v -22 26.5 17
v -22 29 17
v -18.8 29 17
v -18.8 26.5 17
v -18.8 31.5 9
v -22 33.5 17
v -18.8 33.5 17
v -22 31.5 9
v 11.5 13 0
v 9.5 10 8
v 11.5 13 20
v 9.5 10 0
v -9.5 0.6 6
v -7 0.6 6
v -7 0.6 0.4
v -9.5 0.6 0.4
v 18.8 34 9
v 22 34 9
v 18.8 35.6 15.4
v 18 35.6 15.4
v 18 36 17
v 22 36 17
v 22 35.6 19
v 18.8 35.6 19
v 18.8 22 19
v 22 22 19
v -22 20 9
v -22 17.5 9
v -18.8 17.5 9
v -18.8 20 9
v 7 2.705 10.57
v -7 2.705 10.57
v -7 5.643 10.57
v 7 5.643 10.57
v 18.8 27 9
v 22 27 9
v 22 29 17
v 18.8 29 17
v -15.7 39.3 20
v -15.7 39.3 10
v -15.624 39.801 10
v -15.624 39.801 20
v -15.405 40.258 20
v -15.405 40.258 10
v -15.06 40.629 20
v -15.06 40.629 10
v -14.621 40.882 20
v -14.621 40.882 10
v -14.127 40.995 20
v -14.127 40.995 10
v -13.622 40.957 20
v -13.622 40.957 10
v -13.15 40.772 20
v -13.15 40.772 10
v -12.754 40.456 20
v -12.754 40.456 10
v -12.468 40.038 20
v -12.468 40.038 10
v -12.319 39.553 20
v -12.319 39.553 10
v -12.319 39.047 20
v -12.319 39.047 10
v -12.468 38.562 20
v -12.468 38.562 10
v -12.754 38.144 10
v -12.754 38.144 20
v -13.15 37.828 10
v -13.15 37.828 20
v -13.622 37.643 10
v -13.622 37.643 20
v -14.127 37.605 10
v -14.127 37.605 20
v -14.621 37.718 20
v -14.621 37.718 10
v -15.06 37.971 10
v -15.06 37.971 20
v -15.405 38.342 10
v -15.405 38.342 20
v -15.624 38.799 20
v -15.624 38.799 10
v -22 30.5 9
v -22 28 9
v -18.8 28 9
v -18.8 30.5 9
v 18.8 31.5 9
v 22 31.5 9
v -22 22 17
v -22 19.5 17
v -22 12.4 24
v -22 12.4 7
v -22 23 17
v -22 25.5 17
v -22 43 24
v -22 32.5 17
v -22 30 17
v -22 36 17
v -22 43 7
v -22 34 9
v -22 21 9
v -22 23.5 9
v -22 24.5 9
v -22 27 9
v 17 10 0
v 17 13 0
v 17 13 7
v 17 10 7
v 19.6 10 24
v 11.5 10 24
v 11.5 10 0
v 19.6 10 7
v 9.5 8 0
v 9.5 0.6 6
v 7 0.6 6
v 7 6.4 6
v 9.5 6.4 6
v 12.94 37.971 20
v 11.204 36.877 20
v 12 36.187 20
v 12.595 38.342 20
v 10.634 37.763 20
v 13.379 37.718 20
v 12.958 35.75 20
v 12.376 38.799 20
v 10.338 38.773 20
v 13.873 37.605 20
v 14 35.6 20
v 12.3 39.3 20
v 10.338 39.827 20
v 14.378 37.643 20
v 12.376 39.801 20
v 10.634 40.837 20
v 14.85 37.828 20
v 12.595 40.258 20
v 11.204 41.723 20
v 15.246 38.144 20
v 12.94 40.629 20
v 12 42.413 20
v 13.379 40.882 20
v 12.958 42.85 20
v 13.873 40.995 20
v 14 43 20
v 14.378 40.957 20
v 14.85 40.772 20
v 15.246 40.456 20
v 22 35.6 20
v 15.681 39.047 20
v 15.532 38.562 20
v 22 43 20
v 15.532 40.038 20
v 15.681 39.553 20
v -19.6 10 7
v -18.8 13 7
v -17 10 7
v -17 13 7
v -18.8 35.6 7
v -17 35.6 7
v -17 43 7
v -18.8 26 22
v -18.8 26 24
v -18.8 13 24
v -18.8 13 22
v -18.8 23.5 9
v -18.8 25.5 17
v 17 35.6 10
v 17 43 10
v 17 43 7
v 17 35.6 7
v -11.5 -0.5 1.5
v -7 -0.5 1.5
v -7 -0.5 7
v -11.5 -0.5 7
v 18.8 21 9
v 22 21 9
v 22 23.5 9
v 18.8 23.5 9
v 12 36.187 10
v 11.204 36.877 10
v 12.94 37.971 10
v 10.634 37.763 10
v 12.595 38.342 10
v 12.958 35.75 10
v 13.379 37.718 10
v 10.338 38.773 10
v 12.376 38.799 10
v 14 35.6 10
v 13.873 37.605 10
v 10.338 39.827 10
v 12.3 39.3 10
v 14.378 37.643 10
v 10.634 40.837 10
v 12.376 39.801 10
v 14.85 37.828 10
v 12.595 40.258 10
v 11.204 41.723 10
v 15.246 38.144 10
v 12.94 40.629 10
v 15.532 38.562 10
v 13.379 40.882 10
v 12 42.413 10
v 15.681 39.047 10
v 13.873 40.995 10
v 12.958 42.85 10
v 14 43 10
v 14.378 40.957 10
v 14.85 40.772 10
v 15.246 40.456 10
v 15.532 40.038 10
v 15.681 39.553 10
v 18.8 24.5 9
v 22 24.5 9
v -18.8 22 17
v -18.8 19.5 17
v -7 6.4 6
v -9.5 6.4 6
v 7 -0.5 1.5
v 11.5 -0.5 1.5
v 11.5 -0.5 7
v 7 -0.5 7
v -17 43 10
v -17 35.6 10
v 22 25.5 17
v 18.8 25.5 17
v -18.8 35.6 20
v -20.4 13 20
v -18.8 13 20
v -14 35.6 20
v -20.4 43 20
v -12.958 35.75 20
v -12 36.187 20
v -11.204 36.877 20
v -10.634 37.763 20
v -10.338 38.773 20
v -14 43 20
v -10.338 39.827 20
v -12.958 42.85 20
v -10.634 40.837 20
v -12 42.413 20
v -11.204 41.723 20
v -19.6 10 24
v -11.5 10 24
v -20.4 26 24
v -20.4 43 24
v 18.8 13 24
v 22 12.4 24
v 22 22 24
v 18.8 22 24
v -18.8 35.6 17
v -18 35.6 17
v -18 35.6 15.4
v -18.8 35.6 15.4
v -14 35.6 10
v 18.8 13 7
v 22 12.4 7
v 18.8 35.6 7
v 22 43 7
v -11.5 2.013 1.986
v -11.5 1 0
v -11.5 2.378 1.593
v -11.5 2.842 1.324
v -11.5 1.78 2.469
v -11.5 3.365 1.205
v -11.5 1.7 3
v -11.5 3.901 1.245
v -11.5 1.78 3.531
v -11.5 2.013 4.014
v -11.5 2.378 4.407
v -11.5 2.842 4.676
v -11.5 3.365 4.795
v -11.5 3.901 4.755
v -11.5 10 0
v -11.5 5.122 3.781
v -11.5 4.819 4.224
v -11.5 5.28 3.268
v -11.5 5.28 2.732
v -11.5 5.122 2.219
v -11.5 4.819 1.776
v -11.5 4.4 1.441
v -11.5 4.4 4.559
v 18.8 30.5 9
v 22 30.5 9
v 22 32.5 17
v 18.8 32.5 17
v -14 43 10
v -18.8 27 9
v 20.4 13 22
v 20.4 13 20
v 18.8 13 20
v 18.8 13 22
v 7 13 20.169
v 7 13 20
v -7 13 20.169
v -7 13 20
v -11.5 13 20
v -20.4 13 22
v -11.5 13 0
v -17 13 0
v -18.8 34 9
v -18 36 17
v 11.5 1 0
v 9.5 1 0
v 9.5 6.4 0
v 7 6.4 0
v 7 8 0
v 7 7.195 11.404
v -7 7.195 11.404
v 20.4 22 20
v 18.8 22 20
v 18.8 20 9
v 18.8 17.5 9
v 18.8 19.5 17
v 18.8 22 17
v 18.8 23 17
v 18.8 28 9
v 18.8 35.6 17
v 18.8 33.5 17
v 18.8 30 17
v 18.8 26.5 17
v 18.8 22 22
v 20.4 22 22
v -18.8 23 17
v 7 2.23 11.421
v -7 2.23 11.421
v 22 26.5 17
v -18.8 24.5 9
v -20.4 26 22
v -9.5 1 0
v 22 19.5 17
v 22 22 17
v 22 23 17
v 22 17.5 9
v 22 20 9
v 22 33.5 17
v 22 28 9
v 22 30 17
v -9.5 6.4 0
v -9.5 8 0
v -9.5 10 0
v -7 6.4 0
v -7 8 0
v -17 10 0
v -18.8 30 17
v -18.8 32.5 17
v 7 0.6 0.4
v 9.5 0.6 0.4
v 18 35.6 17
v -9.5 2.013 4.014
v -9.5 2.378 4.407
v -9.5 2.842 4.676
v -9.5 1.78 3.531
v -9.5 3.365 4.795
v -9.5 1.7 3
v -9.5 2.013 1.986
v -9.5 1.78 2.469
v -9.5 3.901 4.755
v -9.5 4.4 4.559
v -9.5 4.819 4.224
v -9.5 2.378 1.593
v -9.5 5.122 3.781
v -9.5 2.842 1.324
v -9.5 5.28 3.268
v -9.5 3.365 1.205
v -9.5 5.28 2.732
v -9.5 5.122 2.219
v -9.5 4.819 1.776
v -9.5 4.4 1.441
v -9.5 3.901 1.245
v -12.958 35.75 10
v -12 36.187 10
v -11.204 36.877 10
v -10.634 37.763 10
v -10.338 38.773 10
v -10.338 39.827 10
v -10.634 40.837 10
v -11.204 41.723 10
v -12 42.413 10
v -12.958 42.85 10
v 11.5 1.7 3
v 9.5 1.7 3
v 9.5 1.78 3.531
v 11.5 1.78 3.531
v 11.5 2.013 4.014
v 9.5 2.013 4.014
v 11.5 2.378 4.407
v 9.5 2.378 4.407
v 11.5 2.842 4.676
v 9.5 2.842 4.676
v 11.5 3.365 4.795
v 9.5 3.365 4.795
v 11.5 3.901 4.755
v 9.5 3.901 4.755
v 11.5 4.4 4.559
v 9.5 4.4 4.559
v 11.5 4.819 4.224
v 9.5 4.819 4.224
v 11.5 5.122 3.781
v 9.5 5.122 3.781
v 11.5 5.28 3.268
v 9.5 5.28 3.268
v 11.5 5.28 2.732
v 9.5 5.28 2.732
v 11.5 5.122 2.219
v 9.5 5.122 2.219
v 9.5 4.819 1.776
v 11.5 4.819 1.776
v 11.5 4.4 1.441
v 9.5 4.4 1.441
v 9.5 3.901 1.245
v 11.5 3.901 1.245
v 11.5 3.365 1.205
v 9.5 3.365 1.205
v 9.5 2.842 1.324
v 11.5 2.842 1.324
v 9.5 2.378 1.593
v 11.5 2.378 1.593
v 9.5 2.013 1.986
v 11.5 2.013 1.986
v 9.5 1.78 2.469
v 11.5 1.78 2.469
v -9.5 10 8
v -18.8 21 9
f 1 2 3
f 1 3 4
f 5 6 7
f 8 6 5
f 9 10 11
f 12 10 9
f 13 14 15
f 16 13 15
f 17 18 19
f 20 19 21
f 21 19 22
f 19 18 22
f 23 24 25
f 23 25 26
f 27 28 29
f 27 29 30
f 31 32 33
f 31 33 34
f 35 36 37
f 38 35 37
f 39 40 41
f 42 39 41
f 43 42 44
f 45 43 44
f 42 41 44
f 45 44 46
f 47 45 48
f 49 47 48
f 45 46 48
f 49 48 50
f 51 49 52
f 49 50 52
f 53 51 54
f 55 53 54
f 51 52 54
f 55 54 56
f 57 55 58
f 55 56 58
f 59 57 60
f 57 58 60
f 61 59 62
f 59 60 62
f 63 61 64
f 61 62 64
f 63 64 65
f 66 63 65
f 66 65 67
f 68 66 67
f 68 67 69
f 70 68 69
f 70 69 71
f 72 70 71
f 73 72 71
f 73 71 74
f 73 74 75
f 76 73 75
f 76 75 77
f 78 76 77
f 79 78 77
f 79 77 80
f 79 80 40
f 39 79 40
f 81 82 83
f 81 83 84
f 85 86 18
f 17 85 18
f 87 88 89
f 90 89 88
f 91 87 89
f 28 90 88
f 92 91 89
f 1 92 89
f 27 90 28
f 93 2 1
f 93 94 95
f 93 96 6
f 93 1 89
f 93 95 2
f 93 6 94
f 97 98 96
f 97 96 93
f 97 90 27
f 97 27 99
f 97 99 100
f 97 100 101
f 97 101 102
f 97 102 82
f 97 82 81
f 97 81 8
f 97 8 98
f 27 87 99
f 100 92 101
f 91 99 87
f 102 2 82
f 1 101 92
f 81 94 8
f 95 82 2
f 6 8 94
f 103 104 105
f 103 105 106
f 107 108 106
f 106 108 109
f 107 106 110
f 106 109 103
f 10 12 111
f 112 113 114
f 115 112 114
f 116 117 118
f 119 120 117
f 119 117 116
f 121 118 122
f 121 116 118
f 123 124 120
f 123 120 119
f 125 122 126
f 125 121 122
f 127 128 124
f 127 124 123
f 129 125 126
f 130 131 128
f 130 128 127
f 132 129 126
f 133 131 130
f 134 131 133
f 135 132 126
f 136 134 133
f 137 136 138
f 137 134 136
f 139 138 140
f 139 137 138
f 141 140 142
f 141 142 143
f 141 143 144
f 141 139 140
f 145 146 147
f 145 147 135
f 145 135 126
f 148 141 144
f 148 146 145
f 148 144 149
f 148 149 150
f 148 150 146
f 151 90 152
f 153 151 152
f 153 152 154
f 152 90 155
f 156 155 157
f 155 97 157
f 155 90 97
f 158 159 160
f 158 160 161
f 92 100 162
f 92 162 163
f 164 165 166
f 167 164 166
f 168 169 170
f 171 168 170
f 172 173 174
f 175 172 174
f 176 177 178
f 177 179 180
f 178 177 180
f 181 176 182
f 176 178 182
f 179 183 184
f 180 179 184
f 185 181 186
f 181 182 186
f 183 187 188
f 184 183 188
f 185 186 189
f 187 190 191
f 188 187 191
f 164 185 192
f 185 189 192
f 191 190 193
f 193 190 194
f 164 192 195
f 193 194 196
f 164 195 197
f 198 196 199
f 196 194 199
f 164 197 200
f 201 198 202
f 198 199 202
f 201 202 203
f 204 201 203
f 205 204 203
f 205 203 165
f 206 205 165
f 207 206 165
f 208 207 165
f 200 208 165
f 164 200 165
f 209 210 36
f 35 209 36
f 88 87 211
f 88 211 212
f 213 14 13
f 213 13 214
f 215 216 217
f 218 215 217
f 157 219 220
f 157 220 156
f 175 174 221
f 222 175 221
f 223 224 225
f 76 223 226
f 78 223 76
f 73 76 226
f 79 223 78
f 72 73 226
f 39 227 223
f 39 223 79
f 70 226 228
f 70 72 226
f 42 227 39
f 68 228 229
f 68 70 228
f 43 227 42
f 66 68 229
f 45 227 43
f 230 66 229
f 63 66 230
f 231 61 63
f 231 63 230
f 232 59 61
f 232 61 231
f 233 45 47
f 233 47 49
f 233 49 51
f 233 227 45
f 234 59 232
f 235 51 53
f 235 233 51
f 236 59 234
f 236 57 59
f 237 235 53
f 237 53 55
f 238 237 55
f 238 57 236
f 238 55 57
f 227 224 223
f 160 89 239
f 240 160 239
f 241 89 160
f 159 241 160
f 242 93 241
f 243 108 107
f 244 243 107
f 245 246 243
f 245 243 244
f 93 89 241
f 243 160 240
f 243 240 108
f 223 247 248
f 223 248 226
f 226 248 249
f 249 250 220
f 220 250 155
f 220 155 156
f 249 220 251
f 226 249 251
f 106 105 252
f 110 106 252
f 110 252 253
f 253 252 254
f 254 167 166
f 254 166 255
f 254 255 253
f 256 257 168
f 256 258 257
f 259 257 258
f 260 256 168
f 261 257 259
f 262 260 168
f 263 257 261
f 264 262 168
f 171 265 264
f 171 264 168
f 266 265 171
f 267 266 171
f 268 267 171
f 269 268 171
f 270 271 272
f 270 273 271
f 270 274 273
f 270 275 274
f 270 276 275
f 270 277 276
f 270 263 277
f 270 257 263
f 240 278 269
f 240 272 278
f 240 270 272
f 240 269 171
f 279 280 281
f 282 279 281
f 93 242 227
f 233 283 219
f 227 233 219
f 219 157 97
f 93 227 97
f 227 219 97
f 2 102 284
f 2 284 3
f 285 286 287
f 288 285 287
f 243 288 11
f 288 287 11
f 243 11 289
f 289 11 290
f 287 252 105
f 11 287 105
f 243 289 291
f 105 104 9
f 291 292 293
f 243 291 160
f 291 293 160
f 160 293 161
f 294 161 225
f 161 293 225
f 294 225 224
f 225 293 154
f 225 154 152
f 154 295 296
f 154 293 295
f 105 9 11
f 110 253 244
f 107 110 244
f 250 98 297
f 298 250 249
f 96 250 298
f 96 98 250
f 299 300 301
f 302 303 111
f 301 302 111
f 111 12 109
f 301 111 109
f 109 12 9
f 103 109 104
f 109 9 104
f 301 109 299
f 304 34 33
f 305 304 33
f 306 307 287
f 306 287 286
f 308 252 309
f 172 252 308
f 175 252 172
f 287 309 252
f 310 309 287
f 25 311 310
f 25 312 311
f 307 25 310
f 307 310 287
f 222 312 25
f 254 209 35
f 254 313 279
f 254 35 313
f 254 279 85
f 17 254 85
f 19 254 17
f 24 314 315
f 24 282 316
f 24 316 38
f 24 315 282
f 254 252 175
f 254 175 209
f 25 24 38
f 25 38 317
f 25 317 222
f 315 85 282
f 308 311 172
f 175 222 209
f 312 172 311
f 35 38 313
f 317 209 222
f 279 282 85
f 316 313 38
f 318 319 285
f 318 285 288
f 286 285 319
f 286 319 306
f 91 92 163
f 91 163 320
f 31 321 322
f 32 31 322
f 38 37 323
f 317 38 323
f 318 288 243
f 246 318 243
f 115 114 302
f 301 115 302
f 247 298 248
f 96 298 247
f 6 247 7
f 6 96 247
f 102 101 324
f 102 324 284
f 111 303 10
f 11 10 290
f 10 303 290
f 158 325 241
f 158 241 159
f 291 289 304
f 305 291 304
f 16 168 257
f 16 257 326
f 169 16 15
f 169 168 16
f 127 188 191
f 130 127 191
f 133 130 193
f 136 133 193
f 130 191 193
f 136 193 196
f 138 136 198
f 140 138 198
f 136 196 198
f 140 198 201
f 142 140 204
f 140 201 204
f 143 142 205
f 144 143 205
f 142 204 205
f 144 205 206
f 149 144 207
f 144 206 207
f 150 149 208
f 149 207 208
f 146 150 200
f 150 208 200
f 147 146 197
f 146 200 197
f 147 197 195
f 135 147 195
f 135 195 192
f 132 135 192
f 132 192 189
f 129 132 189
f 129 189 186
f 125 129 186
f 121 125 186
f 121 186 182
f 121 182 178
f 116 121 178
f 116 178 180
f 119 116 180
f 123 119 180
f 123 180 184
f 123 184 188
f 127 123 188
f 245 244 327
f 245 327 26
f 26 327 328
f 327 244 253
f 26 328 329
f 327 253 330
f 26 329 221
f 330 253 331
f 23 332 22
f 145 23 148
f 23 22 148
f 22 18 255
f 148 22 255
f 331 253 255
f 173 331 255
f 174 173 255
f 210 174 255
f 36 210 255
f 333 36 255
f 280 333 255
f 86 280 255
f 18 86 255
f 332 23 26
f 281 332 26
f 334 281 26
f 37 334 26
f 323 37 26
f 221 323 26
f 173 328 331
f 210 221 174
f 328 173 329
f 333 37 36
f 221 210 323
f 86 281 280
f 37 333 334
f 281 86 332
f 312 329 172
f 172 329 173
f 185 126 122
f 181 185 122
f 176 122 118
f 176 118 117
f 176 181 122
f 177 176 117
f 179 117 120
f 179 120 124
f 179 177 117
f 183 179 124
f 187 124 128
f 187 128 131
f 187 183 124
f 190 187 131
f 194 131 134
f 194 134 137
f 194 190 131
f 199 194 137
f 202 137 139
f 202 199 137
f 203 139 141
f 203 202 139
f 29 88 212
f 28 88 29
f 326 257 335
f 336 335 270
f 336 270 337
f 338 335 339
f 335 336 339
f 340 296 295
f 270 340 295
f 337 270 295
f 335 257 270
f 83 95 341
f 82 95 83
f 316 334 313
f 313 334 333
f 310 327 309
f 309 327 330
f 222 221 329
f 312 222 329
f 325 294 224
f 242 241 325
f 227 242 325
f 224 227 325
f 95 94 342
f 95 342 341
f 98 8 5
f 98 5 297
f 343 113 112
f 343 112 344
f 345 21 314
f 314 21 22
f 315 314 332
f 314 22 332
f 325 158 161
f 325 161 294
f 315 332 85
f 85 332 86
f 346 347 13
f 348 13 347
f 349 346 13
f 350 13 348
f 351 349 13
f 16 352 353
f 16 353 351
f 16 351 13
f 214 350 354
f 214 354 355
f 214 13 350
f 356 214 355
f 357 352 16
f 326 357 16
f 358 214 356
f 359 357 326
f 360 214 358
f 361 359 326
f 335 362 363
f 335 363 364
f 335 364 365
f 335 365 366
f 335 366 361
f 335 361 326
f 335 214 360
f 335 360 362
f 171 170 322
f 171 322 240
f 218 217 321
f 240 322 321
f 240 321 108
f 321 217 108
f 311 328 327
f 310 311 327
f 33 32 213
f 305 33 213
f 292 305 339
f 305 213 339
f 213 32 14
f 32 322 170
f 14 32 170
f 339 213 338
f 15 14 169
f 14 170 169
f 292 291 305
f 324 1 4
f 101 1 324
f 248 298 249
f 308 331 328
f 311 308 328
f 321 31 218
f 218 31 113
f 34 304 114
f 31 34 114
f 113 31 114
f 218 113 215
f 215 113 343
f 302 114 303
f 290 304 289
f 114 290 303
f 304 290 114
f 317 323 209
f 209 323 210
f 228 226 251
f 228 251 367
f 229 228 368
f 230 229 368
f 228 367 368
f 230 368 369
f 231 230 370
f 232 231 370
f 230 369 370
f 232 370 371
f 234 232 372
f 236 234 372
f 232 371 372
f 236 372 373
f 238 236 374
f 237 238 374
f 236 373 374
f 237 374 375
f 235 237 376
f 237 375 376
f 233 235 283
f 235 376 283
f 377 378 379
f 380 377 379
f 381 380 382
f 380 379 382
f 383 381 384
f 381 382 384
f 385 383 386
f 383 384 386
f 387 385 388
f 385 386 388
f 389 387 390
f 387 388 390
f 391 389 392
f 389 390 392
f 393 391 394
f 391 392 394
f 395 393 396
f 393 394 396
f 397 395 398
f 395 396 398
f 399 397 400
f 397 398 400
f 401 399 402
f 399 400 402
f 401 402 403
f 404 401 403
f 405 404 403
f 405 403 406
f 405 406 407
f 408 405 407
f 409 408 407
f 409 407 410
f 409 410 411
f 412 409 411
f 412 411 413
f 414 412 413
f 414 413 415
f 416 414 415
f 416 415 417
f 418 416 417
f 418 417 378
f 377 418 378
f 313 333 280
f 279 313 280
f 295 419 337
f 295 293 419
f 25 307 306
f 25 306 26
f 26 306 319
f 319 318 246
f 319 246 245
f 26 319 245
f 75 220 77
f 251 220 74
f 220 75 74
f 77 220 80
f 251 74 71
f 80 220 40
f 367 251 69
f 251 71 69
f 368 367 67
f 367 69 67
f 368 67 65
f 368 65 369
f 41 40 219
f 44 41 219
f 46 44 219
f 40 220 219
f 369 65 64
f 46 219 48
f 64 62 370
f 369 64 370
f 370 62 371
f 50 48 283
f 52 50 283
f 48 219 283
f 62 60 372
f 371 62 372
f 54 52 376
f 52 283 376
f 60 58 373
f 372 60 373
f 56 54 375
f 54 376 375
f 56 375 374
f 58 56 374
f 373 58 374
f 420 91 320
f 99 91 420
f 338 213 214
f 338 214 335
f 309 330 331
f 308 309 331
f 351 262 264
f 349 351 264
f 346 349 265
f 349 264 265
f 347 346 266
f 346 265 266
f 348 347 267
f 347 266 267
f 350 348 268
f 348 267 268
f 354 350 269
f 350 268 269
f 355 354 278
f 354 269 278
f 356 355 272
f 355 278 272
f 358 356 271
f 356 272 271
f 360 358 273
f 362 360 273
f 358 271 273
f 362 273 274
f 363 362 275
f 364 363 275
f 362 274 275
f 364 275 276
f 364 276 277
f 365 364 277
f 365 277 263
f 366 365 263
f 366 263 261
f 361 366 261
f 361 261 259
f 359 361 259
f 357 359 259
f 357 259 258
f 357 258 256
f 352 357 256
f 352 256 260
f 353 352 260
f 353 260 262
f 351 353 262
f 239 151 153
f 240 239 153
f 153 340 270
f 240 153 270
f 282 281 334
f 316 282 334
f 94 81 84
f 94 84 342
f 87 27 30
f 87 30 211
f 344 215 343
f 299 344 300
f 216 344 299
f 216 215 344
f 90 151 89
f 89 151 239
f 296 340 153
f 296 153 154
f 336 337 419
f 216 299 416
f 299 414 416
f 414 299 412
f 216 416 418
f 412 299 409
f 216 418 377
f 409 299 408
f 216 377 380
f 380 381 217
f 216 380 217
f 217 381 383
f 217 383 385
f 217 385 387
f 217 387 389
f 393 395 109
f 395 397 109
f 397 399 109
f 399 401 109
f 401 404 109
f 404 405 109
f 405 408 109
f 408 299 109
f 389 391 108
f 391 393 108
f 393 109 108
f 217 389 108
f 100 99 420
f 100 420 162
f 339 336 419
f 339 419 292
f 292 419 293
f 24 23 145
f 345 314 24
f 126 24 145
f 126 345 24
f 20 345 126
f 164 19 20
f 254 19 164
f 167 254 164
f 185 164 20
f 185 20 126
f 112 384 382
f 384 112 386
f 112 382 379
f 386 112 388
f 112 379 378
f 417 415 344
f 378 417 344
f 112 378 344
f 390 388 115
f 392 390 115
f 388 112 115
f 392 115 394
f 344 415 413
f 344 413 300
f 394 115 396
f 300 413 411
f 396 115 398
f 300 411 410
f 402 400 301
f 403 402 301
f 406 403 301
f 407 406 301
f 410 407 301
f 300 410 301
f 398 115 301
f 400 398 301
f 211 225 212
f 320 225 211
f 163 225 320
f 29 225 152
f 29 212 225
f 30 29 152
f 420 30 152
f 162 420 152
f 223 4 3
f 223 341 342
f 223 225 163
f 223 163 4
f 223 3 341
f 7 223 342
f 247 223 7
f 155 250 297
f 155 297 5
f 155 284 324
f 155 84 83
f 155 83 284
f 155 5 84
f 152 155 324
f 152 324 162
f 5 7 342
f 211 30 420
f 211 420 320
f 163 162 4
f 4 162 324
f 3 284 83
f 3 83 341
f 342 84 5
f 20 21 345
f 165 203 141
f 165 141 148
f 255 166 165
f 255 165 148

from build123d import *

# Parameters (mm, degrees)
SKETCH_1_W           = 44
SKETCH_1_H           = 34
EXTRUDE_1_DEPTH      = 24
CUT_EXTRUDE_1_DEPTH  = 31
SKETCH_5_W           = 23
SKETCH_5_H           = 10.5
EXTRUDE_4_DEPTH      = 1
EXTRUDE_5_DEPTH      = 23
SKETCH_7_R           = 1.8
CUT_EXTRUDE_2_DEPTH  = 23
CUT_EXTRUDE_4_DEPTH  = 19
CHAMFER_2_SIZE       = 2
CHAMFER_2_SIZE2      = 3
SKETCH_11_R          = 1.7
EXTRUDE_6_DEPTH      = 20
CUT_EXTRUDE_7_DEPTH  = 4
CHAMFER_3_SIZE       = 2.4
SKETCH_14_W          = 40.8
SKETCH_14_H          = 4
CUT_EXTRUDE_8_DEPTH  = 18
SKETCH_15_W          = 44
SKETCH_15_H          = 1
CUT_EXTRUDE_9_DEPTH  = 24
SKETCH_16_W          = 3.2
SKETCH_16_H          = 13.6
CUT_EXTRUDE_10_DEPTH = 5
SKETCH_17_W          = 1.6
SKETCH_17_H          = 4
CUT_EXTRUDE_11_DEPTH = 7.4
CUT_EXTRUDE_12_DEPTH = 7
SKETCH_19_W          = 1
SKETCH_19_H          = 10.5
CUT_EXTRUDE_13_DEPTH = 23
CHAMFER_4_SIZE       = 1.5
CHAMFER_5_SIZE       = 3
CHAMFER_5_SIZE2      = 2
CUT_EXTRUDE_START    = -3
SKETCH_20_W          = 14
SKETCH_20_H          = 11.956557484
CUT_EXTRUDE_14_DEPTH = 17
CHAMFER_6_SIZE       = 10
CHAMFER_6_SIZE_2     = 4
CHAMFER_7_SIZE       = 1
SKETCH_22_W          = 6.7
SKETCH_22_H          = 10
CUT_EXTRUDE_15_DEPTH = 10
SKETCH_24_W          = 6
SKETCH_24_H          = 5.8
CUT_EXTRUDE_16_DEPTH = 2.5


with BuildPart() as part:
    # Эскиз1 → Бобышка-Вытянуть1 (new body)
    with BuildSketch(Plane.XY):
        with Locations((0, 27)):
            Rectangle(SKETCH_1_W, SKETCH_1_H)
    extrude(amount=EXTRUDE_1_DEPTH)

    # Эскиз2 → Вырез-Вытянуть1 (cut)
    with BuildSketch(Plane(origin=(0, 44, 0), x_dir=(1, 0, 0), z_dir=(0, 1, 0))):
        Polygon((-18.8, 0), (18.8, 0), (18.8, -20), (20.4, -20), (20.4, -22), (18.8, -22), (18.8, -24), (-18.8, -24), (-18.8, -22), (-20.4, -22), (-20.4, -20), (-18.8, -20), align=None)
    extrude(amount=-CUT_EXTRUDE_1_DEPTH, mode=Mode.SUBTRACT)



with BuildPart() as body_2:
    # Эскиз5 → Бобышка-Вытянуть4 (new body)
    with BuildSketch(Plane(origin=(0, 0, 0), x_dir=(-1, 0, 0), z_dir=(0, 0, -1))):
        with Locations((0, 4.75)):
            Rectangle(SKETCH_5_W, SKETCH_5_H)
    extrude(amount=EXTRUDE_4_DEPTH)


with BuildPart() as part_1:
    add(part.part)

    add(body_2.part)  # Бобышка-Вытянуть5 merges body 2
    # Эскиз6 → Бобышка-Вытянуть5 (add)
    with BuildSketch(Plane(origin=(11.5, 0, 0), x_dir=(0, 0, -1), z_dir=(1, 0, 0))):
        Polygon((0, -0.5), (-7, -0.5), (-24, 10), (0, 10), align=None)
    extrude(amount=-EXTRUDE_5_DEPTH)

    # Эскиз7 → Вырез-Вытянуть2 (cut)
    with BuildSketch(Plane.ZY.offset(11.5)):
        with Locations(Location((3, 3.5, 0), (0, 0, 270))):
            Circle(SKETCH_7_R)
    extrude(amount=-CUT_EXTRUDE_2_DEPTH, mode=Mode.SUBTRACT)

    # Эскиз8 → Вырез-Вытянуть4 (cut)
    with BuildSketch(Plane.ZY.offset(9.5)):
        Polygon((0, 8), (20, 13), (0, 13), align=None)
    extrude(amount=-CUT_EXTRUDE_4_DEPTH, mode=Mode.SUBTRACT)

    # Фаска2
    chamfer_2_edges = [part_1.edges().sort_by_distance(p)[0] for p in [
        (9.5, 13, 10),
    ]]
    chamfer_2_side = [part_1.faces().sort_by_distance(p)[0] for p in [
        (-18.32664601, 13, 10),
    ]]
    chamfer(chamfer_2_edges, length=CHAMFER_2_SIZE, length2=CHAMFER_2_SIZE2, reference=chamfer_2_side[0])

    # Эскиз11 → Бобышка-Вытянуть6 (add)
    # profile 1 of 2: a face of its own
    with BuildSketch(Plane(origin=(0, 0, 0), x_dir=(-1, 0, 0), z_dir=(0, 0, -1))):
        with BuildLine():
            Line((-14, 43), (-18.8, 43))
            Line((-18.8, 43), (-18.8, 35.6))
            Line((-18.8, 35.6), (-14, 35.6))
            ThreePointArc((-14, 35.6), (-10.3, 39.3), (-14, 43))
        make_face()
        with Locations((-14, 39.3)):
            Circle(SKETCH_11_R, mode=Mode.SUBTRACT)
    # profile 2 of 2: a face of its own
    with BuildSketch(Plane(origin=(0, 0, 0), x_dir=(-1, 0, 0), z_dir=(0, 0, -1))):
        with BuildLine():
            Line((18.8, 35.6), (14, 35.6))
            ThreePointArc((14, 35.6), (10.3, 39.3), (14, 43))
            Line((14, 43), (18.8, 43))
            Line((18.8, 43), (18.8, 35.6))
        make_face()
        with Locations((14, 39.3)):
            Circle(SKETCH_11_R, mode=Mode.SUBTRACT)
    extrude(amount=-EXTRUDE_6_DEPTH)

    # Эскиз13 → Вырез-Вытянуть7 (cut)
    with BuildSketch(Plane.ZY.offset(22)):
        Polygon((9, 34), (17, 36), (17, 33.5), (9, 31.5), align=None)
        Polygon((9, 30.5), (17, 32.5), (17, 30), (9, 28), align=None)
        Polygon((9, 27), (17, 29), (17, 26.5), (9, 24.5), align=None)
        Polygon((9, 23.5), (17, 25.5), (17, 23), (9, 21), align=None)
        Polygon((9, 20), (17, 22), (17, 19.5), (9, 17.5), align=None)
    cut_extrude_7 = extrude(amount=-CUT_EXTRUDE_7_DEPTH, mode=Mode.SUBTRACT)

    # Зеркальное отражение1: Вырез-Вытянуть7 across plane
    add(cut_extrude_7.mirror(Plane(origin=(0, 0, 0), x_dir=(0, 0, 1), z_dir=(1, 0, 0))), mode=Mode.SUBTRACT)

    # Фаска3
    chamfer_3_edges = [part_1.edges().sort_by_distance(p)[0] for p in [
        (22, 10, 12),
        (-22, 10, 12),
    ]]
    chamfer(chamfer_3_edges, length=CHAMFER_3_SIZE)

    # Эскиз14 → Вырез-Вытянуть8 (cut)
    with BuildSketch(Plane(origin=(0, 44, 0), x_dir=(1, 0, 0), z_dir=(0, 1, 0))):
        with Locations((0, -22)):
            Rectangle(SKETCH_14_W, SKETCH_14_H)
    extrude(amount=-CUT_EXTRUDE_8_DEPTH, mode=Mode.SUBTRACT)

    # Эскиз15 → Вырез-Вытянуть9 (cut)
    with BuildSketch(Plane(origin=(0, 0, 0), x_dir=(-1, 0, 0), z_dir=(0, 0, -1))):
        with Locations((0, 43.5)):
            Rectangle(SKETCH_15_W, SKETCH_15_H)
    extrude(amount=-CUT_EXTRUDE_9_DEPTH, mode=Mode.SUBTRACT)

    # Эскиз16 → Вырез-Вытянуть10 (cut)
    with BuildSketch(Plane.XY.offset(24)):
        with Locations((20.4, 28.8)):
            Rectangle(SKETCH_16_W, SKETCH_16_H)
    extrude(amount=-CUT_EXTRUDE_10_DEPTH, mode=Mode.SUBTRACT)

    # Эскиз17 → Вырез-Вытянуть11 (cut)
    with BuildSketch(Plane(origin=(0, 43, 0), x_dir=(1, 0, 0), z_dir=(0, 1, 0))):
        with Locations((21.2, -22)):
            Rectangle(SKETCH_17_W, SKETCH_17_H)
    extrude(amount=-CUT_EXTRUDE_11_DEPTH, mode=Mode.SUBTRACT)

    # Эскиз18 → Вырез-Вытянуть12 (cut)
    with BuildSketch(Plane(origin=(0, 0, 0), x_dir=(-1, 0, 0), z_dir=(0, 0, -1))):
        Polygon((-22, 43), (-17, 43), (-17, 10), (-19.6, 10), (-22, 12.4), align=None)
        Polygon((22, 12.4), (19.6, 10), (17, 10), (17, 43), (22, 43), align=None)
    extrude(amount=-CUT_EXTRUDE_12_DEPTH, mode=Mode.SUBTRACT)

    # Эскиз19 → Вырез-Вытянуть13 (cut)
    with BuildSketch(Plane.ZY.offset(11.5)):
        with Locations((-0.5, 4.75)):
            Rectangle(SKETCH_19_W, SKETCH_19_H)
    extrude(amount=-CUT_EXTRUDE_13_DEPTH, mode=Mode.SUBTRACT)

    # Фаска4
    chamfer_4_edges = [part_1.edges().sort_by_distance(p)[0] for p in [
        (0, -0.5, 0),
    ]]
    chamfer(chamfer_4_edges, length=CHAMFER_4_SIZE)

    # Фаска5
    chamfer_5_edges = [part_1.edges().sort_by_distance(p)[0] for p in [
        (-9.5, 13, 10),
    ]]
    chamfer_5_side = [part_1.faces().sort_by_distance(p)[0] for p in [
        (-9.5, 11.333333333, 6.666666667),
    ]]
    chamfer(chamfer_5_edges, length=CHAMFER_5_SIZE, length2=CHAMFER_5_SIZE2, reference=chamfer_5_side[0])

    # Эскиз20 → Вырез-Вытянуть14 (cut)
    with BuildSketch(Plane(origin=(0, 0, 0), x_dir=(1, 0, 0), z_dir=(0, 1, 0)).offset(CUT_EXTRUDE_START)):
        with Locations((0, -4.591721258)):
            Rectangle(SKETCH_20_W, SKETCH_20_H)
    extrude(amount=CUT_EXTRUDE_14_DEPTH, mode=Mode.SUBTRACT)

    # Фаска6
    # the kernel refuses this chamfer: 10, 4 mm, written as the material it takes off along each edge
    with BuildSketch(Plane(origin=(7, 10.6425, 10.57), x_dir=(0, 0.254985552304956, 0.966944863017399), z_dir=(-1, 0, 0))) as chamfer_6_piece_1:
        Polygon((CHAMFER_6_SIZE * 0.999917387214, -CHAMFER_6_SIZE * 0.0128537444865), (-CHAMFER_6_SIZE_2 * 0.254985552305, -CHAMFER_6_SIZE_2 * 0.966944863017), (0, 0), align=None)
    extrude(amount=14, mode=Mode.SUBTRACT)

    # Фаска7
    chamfer_7_edges = [part_1.edges().sort_by_distance(p)[0] for p in [
        (0, 1.705, 10.57),
        (0, 6.6425, 10.57),
    ]]
    chamfer(chamfer_7_edges, length=CHAMFER_7_SIZE)

    # Эскиз22 → Вырез-Вытянуть15 (cut)
    with BuildSketch(Plane(origin=(0, 43, 0), x_dir=(1, 0, 0), z_dir=(0, 1, 0))):
        with Locations((13.65, -5)):
            Rectangle(SKETCH_22_W, SKETCH_22_H)
        with Locations((-13.65, -5)):
            Rectangle(SKETCH_22_W, SKETCH_22_H)
    extrude(amount=-CUT_EXTRUDE_15_DEPTH, mode=Mode.SUBTRACT)

    # Эскиз24 → Вырез-Вытянуть16 (cut)
    with BuildSketch(Plane(origin=(-7, 0, 0), x_dir=(0, 0, -1), z_dir=(1, 0, 0))):
        with Locations((-3, 3.5)):
            Rectangle(SKETCH_24_W, SKETCH_24_H)
    cut_extrude_16 = extrude(amount=-CUT_EXTRUDE_16_DEPTH, mode=Mode.SUBTRACT)

    # Зеркальное отражение2: Вырез-Вытянуть16 across plane
    add(cut_extrude_16.mirror(Plane(origin=(0, 0, 0), x_dir=(0, 0, 1), z_dir=(1, 0, 0))), mode=Mode.SUBTRACT)


solid = part_1.part
